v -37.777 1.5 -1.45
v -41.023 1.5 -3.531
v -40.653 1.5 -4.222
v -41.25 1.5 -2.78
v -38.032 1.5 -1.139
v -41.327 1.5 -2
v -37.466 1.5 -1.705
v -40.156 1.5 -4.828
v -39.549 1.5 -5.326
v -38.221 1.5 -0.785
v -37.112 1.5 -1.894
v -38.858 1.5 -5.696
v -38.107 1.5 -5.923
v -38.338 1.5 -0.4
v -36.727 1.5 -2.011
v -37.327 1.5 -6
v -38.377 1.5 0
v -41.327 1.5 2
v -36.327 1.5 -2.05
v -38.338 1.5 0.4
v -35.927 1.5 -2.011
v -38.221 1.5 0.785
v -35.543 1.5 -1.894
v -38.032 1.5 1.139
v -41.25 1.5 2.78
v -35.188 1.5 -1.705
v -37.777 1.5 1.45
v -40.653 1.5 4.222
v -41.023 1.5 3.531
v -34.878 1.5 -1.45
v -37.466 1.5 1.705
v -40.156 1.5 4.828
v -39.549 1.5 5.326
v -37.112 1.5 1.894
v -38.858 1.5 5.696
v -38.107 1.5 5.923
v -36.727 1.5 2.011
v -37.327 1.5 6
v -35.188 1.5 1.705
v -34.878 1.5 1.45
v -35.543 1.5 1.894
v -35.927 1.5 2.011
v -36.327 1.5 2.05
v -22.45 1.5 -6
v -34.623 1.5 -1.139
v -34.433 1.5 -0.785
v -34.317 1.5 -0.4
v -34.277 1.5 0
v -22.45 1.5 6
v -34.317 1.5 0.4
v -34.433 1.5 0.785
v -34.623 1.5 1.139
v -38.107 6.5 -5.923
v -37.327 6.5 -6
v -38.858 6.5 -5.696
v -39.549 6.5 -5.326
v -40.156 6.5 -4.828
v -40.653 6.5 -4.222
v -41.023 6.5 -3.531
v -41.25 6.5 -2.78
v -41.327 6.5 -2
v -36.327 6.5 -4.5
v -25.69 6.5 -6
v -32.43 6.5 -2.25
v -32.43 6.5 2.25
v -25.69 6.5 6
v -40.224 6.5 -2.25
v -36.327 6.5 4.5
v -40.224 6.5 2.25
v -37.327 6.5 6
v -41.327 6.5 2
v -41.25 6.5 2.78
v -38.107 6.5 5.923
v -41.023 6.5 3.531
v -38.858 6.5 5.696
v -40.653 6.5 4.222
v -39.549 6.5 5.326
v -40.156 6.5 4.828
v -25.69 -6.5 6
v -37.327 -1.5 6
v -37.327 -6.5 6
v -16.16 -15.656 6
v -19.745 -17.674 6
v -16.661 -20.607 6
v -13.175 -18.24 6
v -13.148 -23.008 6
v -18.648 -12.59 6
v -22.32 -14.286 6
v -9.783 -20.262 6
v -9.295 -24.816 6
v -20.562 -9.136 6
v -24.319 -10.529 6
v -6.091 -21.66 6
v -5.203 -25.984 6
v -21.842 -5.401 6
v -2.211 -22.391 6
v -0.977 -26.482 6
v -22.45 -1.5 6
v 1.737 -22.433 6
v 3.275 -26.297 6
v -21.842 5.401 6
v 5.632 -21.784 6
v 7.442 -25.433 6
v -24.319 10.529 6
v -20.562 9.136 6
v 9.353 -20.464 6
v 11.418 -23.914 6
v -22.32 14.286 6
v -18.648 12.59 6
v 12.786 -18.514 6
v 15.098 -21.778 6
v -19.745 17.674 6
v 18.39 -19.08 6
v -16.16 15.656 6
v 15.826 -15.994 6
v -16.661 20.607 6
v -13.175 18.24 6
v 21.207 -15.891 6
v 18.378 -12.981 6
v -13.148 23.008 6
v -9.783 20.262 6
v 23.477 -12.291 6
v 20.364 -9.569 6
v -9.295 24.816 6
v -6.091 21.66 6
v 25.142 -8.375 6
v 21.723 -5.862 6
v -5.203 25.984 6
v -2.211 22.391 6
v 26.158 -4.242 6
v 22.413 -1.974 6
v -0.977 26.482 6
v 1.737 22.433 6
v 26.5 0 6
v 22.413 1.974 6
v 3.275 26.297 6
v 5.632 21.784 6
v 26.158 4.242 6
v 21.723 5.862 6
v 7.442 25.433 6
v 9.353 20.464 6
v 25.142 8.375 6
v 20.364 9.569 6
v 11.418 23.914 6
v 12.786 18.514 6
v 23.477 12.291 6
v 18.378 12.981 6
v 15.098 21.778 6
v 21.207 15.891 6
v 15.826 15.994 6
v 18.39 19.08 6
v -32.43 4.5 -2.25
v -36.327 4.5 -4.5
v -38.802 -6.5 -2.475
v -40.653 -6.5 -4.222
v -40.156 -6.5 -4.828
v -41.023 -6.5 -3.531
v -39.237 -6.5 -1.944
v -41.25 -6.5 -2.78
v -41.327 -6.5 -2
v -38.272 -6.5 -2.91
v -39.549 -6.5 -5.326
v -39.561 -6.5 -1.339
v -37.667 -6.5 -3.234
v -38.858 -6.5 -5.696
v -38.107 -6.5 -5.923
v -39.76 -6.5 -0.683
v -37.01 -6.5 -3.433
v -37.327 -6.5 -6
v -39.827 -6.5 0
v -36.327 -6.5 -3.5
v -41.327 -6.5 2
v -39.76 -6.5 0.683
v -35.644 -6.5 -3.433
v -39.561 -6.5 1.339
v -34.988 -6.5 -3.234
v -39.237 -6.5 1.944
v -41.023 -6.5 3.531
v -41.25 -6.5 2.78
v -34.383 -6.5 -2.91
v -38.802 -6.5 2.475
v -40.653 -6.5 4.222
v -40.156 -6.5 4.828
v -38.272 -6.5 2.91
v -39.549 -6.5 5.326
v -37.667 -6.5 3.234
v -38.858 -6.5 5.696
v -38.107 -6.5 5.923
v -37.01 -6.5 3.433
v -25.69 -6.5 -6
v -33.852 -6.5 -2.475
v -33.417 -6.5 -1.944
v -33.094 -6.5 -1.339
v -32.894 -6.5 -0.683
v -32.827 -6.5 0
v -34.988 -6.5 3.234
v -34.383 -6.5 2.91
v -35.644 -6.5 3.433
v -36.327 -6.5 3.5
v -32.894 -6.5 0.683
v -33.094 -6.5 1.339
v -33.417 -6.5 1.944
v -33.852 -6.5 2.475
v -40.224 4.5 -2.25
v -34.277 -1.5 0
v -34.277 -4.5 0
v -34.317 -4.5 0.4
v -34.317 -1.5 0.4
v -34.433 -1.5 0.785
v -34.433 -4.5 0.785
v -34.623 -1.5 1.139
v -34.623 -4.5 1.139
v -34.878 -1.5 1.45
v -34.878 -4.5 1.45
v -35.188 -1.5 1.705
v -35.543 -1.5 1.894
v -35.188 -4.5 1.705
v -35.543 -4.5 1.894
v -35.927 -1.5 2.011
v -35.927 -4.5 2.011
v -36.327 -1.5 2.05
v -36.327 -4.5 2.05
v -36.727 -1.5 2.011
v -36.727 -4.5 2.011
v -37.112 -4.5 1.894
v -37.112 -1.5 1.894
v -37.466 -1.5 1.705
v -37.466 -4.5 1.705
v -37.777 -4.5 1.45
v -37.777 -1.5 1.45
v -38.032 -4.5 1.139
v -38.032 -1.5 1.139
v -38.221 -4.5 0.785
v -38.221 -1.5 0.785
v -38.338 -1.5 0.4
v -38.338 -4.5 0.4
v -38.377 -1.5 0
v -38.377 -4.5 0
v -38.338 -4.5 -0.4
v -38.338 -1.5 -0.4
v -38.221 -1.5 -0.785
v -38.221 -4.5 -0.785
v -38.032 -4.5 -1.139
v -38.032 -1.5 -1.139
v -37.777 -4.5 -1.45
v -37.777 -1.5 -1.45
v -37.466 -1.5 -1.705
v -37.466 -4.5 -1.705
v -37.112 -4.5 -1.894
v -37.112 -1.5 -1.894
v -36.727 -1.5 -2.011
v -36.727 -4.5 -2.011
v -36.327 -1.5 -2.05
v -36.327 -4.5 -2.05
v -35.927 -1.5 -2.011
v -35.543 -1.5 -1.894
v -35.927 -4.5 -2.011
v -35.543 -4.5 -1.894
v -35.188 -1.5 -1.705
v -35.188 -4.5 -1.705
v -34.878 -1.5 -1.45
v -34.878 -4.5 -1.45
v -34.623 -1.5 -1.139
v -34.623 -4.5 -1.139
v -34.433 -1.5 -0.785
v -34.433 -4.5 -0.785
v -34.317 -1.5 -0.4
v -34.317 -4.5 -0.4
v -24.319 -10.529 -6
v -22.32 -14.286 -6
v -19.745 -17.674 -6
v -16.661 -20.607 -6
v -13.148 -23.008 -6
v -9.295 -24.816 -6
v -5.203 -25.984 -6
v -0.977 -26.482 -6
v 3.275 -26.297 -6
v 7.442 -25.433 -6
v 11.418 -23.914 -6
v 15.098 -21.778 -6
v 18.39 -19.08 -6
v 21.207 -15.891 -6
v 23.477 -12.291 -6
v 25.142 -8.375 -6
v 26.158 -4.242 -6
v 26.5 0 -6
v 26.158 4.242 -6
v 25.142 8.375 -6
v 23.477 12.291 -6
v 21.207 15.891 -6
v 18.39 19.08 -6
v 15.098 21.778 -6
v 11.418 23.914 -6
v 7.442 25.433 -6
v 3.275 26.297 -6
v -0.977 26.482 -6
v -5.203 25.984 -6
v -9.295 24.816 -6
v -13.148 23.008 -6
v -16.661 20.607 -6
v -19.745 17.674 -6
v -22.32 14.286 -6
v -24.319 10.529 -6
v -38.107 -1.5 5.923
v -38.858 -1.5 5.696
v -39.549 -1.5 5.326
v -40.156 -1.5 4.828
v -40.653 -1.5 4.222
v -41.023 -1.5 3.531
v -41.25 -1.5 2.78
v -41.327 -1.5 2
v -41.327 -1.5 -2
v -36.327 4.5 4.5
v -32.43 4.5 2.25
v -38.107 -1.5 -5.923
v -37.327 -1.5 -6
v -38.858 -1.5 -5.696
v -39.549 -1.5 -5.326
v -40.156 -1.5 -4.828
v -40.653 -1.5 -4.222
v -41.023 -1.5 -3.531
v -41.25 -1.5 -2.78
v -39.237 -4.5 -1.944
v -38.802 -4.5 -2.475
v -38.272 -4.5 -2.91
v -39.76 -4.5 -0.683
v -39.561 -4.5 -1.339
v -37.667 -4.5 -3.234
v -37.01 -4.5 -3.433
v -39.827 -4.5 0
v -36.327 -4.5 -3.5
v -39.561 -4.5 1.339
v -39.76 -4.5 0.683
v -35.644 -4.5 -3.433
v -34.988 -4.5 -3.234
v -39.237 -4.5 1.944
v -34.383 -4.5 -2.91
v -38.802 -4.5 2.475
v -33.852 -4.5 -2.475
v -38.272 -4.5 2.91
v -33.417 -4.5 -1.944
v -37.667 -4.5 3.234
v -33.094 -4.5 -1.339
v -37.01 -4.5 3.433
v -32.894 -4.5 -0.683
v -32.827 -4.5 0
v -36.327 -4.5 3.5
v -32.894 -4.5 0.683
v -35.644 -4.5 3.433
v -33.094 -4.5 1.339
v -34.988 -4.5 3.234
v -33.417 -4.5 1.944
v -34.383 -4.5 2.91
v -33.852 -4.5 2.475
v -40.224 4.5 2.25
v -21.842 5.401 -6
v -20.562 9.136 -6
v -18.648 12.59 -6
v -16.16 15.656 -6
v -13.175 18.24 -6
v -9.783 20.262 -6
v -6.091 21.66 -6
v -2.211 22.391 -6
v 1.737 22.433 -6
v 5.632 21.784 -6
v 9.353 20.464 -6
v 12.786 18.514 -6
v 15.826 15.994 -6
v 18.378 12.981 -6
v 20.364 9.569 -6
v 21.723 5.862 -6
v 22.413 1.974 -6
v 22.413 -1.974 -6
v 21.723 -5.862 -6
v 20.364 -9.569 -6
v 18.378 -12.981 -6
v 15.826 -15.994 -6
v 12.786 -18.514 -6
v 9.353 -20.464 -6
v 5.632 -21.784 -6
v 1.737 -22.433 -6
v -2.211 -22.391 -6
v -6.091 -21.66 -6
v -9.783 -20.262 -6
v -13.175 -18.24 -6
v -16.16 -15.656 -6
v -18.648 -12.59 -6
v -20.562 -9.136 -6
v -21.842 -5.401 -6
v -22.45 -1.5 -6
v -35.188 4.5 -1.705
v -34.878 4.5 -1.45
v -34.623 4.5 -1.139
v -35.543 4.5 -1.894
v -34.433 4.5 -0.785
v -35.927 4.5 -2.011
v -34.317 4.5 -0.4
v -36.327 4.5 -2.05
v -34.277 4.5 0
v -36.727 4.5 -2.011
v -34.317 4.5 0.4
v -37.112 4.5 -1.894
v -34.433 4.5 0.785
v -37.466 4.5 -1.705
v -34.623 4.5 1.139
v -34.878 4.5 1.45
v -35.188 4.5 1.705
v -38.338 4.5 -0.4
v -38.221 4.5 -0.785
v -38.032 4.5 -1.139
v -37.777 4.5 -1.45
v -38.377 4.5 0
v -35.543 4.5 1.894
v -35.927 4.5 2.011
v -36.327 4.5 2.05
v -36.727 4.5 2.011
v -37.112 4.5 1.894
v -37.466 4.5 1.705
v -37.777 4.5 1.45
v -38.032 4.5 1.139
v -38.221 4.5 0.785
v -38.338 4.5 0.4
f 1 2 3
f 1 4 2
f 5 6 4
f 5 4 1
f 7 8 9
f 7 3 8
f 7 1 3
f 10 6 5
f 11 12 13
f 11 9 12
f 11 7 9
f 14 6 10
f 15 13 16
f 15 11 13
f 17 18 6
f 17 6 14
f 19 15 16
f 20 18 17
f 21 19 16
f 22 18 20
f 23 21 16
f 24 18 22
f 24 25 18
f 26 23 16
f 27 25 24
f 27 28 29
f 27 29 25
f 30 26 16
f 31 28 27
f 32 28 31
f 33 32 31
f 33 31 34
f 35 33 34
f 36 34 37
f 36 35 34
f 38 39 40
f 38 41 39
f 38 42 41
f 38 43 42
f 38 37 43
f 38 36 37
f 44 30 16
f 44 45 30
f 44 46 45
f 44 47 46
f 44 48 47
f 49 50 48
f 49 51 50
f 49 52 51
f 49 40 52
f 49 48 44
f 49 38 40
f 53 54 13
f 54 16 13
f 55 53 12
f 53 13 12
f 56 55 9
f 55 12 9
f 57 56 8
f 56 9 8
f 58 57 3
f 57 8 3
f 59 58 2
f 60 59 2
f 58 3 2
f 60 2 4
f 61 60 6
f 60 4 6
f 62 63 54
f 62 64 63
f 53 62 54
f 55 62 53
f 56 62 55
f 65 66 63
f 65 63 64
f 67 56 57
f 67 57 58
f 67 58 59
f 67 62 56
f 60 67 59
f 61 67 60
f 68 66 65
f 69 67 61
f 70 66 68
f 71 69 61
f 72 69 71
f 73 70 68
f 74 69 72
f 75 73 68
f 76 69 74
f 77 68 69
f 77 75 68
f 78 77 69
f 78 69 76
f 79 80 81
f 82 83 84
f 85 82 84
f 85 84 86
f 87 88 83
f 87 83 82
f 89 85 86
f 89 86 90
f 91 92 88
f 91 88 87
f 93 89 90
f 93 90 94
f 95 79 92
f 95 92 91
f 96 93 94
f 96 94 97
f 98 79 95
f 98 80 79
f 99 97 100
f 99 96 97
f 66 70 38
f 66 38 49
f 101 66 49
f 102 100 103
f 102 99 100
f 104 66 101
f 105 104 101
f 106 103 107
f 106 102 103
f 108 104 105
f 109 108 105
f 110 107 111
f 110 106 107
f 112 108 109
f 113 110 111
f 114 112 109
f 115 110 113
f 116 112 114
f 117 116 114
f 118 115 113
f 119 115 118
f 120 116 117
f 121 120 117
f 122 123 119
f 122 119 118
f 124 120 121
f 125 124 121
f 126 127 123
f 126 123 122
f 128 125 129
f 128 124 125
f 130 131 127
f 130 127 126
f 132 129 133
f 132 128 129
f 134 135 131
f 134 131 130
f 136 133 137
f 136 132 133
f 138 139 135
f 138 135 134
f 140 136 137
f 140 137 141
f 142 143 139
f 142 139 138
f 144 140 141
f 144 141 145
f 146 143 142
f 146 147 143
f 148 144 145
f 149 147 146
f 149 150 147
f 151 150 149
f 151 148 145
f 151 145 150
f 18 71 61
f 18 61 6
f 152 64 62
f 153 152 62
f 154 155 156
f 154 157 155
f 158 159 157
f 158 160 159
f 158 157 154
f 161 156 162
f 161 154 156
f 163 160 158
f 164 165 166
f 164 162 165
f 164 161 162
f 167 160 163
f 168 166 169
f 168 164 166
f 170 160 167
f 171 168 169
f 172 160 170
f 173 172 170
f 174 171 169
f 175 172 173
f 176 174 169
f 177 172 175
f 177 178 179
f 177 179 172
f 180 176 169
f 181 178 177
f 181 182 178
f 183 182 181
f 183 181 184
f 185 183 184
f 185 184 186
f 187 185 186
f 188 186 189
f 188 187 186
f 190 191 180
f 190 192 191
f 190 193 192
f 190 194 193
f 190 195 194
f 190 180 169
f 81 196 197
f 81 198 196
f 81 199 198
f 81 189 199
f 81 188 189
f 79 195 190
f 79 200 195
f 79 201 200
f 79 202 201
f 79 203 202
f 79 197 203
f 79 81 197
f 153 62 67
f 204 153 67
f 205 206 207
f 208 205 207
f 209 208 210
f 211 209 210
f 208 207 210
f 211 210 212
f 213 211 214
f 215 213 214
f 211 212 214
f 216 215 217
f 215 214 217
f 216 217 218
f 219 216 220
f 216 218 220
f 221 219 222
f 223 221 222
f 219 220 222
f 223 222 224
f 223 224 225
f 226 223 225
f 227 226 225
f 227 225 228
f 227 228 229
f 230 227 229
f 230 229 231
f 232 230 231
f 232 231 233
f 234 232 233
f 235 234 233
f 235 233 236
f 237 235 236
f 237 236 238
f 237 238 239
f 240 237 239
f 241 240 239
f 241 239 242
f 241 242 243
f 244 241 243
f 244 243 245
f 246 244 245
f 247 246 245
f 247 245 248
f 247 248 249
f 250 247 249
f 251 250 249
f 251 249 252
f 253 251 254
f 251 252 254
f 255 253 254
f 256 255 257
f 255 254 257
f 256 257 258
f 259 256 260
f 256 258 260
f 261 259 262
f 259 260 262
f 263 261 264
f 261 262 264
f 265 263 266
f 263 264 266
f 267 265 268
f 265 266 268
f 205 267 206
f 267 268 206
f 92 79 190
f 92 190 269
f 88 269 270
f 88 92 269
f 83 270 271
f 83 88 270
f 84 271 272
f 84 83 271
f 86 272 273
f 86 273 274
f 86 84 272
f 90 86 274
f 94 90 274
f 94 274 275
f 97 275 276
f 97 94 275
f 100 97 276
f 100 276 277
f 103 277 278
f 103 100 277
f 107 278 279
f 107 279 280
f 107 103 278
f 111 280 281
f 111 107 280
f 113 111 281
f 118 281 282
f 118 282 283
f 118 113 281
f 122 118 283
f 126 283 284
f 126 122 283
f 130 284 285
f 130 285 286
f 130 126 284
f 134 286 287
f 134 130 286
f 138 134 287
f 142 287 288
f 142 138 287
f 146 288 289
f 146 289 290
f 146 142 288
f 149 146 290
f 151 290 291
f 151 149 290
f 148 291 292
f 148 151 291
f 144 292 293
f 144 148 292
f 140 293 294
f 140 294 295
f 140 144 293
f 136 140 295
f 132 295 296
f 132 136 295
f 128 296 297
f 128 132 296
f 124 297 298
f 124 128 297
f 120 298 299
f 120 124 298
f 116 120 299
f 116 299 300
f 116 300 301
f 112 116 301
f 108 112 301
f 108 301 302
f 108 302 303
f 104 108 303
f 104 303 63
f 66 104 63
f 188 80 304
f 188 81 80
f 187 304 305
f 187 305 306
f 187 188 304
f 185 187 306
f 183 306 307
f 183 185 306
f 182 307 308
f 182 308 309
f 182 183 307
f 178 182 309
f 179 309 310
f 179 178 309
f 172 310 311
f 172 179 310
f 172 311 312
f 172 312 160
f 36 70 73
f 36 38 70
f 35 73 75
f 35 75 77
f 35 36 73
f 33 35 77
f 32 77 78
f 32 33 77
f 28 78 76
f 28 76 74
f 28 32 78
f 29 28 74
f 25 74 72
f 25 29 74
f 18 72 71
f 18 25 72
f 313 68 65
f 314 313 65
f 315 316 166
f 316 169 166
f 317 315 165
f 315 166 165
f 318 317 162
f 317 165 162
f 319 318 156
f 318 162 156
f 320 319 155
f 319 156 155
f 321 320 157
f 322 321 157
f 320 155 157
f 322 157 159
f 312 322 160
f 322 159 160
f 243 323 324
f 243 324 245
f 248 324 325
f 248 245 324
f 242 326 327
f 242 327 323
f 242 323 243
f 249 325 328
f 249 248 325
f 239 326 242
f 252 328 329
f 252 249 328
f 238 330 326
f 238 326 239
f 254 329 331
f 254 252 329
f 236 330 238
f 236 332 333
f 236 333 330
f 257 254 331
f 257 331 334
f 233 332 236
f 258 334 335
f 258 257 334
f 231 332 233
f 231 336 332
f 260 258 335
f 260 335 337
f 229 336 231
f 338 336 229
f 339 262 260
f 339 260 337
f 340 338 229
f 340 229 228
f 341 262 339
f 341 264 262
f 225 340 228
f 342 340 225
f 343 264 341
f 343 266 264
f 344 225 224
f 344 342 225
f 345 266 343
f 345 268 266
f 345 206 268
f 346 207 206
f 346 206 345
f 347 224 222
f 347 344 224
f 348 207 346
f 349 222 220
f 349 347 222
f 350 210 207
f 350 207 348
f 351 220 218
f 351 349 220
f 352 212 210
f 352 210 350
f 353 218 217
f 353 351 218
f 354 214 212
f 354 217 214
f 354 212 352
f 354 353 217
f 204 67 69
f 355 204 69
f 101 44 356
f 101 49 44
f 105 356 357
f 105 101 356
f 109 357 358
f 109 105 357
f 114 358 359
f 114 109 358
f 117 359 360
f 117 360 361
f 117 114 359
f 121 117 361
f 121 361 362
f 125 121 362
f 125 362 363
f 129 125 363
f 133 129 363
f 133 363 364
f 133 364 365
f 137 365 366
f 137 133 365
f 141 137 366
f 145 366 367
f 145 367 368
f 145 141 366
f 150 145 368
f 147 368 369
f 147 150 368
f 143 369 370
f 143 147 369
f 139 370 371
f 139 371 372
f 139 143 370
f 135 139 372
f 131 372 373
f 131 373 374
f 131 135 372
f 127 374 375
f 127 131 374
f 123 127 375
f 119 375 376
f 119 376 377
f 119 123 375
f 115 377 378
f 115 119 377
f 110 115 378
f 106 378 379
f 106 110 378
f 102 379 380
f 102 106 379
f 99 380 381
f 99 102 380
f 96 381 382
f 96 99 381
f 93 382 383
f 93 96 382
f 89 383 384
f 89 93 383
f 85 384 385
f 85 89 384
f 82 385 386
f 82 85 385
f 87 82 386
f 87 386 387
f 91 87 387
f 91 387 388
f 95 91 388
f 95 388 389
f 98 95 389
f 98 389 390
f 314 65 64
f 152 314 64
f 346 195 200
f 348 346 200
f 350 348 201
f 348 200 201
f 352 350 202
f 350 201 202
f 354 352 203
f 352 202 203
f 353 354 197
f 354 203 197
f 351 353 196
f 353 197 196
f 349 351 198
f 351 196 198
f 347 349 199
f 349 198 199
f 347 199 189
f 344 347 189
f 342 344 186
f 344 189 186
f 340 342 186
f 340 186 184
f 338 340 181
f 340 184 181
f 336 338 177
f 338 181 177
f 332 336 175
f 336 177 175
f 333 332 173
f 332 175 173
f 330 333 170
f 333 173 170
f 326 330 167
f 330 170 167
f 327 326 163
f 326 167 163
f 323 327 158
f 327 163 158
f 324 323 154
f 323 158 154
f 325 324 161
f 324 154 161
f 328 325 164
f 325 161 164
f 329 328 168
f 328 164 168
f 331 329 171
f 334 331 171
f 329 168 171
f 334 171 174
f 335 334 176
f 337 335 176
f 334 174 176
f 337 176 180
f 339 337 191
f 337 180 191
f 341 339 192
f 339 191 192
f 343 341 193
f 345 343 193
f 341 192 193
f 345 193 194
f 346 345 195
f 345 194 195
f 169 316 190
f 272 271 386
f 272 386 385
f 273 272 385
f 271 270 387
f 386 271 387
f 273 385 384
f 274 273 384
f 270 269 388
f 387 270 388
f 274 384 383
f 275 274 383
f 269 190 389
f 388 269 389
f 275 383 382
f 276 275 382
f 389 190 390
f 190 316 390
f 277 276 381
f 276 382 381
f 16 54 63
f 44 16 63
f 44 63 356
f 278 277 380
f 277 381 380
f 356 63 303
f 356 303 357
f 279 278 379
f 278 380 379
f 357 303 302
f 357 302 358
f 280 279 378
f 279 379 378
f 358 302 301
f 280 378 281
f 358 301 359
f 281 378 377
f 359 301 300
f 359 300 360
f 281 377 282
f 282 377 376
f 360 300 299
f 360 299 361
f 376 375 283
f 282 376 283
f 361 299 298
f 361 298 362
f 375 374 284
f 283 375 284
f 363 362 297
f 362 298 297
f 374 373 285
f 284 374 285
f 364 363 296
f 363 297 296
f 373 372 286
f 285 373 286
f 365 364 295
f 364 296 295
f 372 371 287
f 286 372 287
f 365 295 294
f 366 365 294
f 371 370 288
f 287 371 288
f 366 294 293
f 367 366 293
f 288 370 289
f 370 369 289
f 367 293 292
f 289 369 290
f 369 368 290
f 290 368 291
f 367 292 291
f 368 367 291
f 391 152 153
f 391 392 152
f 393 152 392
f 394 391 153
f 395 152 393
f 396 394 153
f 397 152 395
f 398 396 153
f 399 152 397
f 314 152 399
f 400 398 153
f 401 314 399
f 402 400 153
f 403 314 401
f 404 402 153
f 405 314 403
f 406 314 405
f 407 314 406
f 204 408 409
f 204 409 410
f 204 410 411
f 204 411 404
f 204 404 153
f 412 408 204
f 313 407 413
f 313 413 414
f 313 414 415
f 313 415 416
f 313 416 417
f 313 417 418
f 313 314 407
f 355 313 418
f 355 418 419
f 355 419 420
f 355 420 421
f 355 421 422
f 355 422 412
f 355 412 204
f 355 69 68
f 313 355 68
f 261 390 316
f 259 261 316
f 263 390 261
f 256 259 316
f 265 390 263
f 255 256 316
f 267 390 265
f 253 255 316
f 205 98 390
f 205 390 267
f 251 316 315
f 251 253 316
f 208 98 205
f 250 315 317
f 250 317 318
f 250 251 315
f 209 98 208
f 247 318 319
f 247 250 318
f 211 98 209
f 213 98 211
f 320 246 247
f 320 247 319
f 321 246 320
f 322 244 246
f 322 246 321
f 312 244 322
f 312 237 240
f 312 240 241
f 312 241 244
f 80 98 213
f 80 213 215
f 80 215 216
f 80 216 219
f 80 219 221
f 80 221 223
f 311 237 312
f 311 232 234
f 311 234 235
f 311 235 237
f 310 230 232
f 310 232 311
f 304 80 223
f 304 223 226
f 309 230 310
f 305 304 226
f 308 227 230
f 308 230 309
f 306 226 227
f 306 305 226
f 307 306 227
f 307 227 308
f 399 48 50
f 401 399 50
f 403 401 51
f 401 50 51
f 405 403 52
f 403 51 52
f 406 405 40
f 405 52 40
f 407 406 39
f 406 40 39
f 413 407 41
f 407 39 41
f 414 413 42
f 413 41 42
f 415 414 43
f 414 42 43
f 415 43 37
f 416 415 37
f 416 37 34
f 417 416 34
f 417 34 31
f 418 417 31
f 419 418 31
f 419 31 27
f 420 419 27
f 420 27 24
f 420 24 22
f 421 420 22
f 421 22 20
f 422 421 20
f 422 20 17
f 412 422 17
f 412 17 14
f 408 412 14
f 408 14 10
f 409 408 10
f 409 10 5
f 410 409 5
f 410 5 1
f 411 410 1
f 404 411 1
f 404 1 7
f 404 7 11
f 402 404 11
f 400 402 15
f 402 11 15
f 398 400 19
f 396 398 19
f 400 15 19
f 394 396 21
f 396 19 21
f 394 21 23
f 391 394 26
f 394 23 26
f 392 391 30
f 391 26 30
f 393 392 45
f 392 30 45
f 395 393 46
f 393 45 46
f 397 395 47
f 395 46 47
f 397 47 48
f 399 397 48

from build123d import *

# Parameters (mm, degrees)
F1_DEPTH = 6
F2_R     = 2.05
F4_DEPTH = 13
F2_R_2   = 3.5
F5_DEPTH = 2
F6_DEPTH = 2
F7_R     = 4


with BuildPart() as f1:
    # F0 (on Top) → F1 (new body, symmetric)
    with BuildSketch(Plane.XY):
        with BuildLine():
            ThreePointArc((-22.449944, 1.5), (22.5, 0), (-22.449944, -1.5))
            Line((-22.449944, -1.5), (-41.327112, -1.5))
            Line((-41.327112, -1.5), (-41.327112, -6.5))
            Line((-41.327112, -6.5), (-25.690465, -6.5))
            ThreePointArc((-25.690465, -6.5), (26.5, 0), (-25.690465, 6.5))
            Line((-25.690465, 6.5), (-41.327112, 6.5))
            Line((-41.327112, 6.5), (-41.327112, 1.5))
            Line((-41.327112, 1.5), (-22.449944, 1.5))
        make_face()
    extrude(amount=F1_DEPTH, both=True)

    # F2 (on face) → F4 (cut, through all)
    with BuildSketch(Plane.XZ.offset(6.5)):
        with Locations((-36.327112, 0)):
            Circle(F2_R)
    extrude(amount=-F4_DEPTH, mode=Mode.SUBTRACT)

    # F2 (on face) → F5 (cut)
    with BuildSketch(Plane.XZ.offset(6.5)):
        with Locations((-36.327112, 0)):
            Circle(F2_R_2)
        with Locations((-36.327112, 0)):
            Circle(F2_R, mode=Mode.SUBTRACT)
    extrude(amount=-F5_DEPTH, mode=Mode.SUBTRACT)

    # F3 (on face) → F6 (cut)
    with BuildSketch(Plane(origin=(0, 6.5, 0), x_dir=(-1, 0, 0), z_dir=(0, 1, 0))):
        Polygon((40.224226, -2.25), (40.224226, 2.25), (36.327112, 4.5), (32.429997, 2.25), (32.429997, -2.25), (36.327112, -4.5), align=None)
    extrude(amount=-F6_DEPTH, mode=Mode.SUBTRACT)

    # F7
    f7_edges = [f1.edges().sort_by_distance(p)[0] for p in [
        (-41.327112, 4, 6),
        (-41.327112, -4, 6),
        (-41.327112, 4, -6),
        (-41.327112, -4, -6),
    ]]
    fillet(f7_edges, radius=F7_R)


solid = f1.part
